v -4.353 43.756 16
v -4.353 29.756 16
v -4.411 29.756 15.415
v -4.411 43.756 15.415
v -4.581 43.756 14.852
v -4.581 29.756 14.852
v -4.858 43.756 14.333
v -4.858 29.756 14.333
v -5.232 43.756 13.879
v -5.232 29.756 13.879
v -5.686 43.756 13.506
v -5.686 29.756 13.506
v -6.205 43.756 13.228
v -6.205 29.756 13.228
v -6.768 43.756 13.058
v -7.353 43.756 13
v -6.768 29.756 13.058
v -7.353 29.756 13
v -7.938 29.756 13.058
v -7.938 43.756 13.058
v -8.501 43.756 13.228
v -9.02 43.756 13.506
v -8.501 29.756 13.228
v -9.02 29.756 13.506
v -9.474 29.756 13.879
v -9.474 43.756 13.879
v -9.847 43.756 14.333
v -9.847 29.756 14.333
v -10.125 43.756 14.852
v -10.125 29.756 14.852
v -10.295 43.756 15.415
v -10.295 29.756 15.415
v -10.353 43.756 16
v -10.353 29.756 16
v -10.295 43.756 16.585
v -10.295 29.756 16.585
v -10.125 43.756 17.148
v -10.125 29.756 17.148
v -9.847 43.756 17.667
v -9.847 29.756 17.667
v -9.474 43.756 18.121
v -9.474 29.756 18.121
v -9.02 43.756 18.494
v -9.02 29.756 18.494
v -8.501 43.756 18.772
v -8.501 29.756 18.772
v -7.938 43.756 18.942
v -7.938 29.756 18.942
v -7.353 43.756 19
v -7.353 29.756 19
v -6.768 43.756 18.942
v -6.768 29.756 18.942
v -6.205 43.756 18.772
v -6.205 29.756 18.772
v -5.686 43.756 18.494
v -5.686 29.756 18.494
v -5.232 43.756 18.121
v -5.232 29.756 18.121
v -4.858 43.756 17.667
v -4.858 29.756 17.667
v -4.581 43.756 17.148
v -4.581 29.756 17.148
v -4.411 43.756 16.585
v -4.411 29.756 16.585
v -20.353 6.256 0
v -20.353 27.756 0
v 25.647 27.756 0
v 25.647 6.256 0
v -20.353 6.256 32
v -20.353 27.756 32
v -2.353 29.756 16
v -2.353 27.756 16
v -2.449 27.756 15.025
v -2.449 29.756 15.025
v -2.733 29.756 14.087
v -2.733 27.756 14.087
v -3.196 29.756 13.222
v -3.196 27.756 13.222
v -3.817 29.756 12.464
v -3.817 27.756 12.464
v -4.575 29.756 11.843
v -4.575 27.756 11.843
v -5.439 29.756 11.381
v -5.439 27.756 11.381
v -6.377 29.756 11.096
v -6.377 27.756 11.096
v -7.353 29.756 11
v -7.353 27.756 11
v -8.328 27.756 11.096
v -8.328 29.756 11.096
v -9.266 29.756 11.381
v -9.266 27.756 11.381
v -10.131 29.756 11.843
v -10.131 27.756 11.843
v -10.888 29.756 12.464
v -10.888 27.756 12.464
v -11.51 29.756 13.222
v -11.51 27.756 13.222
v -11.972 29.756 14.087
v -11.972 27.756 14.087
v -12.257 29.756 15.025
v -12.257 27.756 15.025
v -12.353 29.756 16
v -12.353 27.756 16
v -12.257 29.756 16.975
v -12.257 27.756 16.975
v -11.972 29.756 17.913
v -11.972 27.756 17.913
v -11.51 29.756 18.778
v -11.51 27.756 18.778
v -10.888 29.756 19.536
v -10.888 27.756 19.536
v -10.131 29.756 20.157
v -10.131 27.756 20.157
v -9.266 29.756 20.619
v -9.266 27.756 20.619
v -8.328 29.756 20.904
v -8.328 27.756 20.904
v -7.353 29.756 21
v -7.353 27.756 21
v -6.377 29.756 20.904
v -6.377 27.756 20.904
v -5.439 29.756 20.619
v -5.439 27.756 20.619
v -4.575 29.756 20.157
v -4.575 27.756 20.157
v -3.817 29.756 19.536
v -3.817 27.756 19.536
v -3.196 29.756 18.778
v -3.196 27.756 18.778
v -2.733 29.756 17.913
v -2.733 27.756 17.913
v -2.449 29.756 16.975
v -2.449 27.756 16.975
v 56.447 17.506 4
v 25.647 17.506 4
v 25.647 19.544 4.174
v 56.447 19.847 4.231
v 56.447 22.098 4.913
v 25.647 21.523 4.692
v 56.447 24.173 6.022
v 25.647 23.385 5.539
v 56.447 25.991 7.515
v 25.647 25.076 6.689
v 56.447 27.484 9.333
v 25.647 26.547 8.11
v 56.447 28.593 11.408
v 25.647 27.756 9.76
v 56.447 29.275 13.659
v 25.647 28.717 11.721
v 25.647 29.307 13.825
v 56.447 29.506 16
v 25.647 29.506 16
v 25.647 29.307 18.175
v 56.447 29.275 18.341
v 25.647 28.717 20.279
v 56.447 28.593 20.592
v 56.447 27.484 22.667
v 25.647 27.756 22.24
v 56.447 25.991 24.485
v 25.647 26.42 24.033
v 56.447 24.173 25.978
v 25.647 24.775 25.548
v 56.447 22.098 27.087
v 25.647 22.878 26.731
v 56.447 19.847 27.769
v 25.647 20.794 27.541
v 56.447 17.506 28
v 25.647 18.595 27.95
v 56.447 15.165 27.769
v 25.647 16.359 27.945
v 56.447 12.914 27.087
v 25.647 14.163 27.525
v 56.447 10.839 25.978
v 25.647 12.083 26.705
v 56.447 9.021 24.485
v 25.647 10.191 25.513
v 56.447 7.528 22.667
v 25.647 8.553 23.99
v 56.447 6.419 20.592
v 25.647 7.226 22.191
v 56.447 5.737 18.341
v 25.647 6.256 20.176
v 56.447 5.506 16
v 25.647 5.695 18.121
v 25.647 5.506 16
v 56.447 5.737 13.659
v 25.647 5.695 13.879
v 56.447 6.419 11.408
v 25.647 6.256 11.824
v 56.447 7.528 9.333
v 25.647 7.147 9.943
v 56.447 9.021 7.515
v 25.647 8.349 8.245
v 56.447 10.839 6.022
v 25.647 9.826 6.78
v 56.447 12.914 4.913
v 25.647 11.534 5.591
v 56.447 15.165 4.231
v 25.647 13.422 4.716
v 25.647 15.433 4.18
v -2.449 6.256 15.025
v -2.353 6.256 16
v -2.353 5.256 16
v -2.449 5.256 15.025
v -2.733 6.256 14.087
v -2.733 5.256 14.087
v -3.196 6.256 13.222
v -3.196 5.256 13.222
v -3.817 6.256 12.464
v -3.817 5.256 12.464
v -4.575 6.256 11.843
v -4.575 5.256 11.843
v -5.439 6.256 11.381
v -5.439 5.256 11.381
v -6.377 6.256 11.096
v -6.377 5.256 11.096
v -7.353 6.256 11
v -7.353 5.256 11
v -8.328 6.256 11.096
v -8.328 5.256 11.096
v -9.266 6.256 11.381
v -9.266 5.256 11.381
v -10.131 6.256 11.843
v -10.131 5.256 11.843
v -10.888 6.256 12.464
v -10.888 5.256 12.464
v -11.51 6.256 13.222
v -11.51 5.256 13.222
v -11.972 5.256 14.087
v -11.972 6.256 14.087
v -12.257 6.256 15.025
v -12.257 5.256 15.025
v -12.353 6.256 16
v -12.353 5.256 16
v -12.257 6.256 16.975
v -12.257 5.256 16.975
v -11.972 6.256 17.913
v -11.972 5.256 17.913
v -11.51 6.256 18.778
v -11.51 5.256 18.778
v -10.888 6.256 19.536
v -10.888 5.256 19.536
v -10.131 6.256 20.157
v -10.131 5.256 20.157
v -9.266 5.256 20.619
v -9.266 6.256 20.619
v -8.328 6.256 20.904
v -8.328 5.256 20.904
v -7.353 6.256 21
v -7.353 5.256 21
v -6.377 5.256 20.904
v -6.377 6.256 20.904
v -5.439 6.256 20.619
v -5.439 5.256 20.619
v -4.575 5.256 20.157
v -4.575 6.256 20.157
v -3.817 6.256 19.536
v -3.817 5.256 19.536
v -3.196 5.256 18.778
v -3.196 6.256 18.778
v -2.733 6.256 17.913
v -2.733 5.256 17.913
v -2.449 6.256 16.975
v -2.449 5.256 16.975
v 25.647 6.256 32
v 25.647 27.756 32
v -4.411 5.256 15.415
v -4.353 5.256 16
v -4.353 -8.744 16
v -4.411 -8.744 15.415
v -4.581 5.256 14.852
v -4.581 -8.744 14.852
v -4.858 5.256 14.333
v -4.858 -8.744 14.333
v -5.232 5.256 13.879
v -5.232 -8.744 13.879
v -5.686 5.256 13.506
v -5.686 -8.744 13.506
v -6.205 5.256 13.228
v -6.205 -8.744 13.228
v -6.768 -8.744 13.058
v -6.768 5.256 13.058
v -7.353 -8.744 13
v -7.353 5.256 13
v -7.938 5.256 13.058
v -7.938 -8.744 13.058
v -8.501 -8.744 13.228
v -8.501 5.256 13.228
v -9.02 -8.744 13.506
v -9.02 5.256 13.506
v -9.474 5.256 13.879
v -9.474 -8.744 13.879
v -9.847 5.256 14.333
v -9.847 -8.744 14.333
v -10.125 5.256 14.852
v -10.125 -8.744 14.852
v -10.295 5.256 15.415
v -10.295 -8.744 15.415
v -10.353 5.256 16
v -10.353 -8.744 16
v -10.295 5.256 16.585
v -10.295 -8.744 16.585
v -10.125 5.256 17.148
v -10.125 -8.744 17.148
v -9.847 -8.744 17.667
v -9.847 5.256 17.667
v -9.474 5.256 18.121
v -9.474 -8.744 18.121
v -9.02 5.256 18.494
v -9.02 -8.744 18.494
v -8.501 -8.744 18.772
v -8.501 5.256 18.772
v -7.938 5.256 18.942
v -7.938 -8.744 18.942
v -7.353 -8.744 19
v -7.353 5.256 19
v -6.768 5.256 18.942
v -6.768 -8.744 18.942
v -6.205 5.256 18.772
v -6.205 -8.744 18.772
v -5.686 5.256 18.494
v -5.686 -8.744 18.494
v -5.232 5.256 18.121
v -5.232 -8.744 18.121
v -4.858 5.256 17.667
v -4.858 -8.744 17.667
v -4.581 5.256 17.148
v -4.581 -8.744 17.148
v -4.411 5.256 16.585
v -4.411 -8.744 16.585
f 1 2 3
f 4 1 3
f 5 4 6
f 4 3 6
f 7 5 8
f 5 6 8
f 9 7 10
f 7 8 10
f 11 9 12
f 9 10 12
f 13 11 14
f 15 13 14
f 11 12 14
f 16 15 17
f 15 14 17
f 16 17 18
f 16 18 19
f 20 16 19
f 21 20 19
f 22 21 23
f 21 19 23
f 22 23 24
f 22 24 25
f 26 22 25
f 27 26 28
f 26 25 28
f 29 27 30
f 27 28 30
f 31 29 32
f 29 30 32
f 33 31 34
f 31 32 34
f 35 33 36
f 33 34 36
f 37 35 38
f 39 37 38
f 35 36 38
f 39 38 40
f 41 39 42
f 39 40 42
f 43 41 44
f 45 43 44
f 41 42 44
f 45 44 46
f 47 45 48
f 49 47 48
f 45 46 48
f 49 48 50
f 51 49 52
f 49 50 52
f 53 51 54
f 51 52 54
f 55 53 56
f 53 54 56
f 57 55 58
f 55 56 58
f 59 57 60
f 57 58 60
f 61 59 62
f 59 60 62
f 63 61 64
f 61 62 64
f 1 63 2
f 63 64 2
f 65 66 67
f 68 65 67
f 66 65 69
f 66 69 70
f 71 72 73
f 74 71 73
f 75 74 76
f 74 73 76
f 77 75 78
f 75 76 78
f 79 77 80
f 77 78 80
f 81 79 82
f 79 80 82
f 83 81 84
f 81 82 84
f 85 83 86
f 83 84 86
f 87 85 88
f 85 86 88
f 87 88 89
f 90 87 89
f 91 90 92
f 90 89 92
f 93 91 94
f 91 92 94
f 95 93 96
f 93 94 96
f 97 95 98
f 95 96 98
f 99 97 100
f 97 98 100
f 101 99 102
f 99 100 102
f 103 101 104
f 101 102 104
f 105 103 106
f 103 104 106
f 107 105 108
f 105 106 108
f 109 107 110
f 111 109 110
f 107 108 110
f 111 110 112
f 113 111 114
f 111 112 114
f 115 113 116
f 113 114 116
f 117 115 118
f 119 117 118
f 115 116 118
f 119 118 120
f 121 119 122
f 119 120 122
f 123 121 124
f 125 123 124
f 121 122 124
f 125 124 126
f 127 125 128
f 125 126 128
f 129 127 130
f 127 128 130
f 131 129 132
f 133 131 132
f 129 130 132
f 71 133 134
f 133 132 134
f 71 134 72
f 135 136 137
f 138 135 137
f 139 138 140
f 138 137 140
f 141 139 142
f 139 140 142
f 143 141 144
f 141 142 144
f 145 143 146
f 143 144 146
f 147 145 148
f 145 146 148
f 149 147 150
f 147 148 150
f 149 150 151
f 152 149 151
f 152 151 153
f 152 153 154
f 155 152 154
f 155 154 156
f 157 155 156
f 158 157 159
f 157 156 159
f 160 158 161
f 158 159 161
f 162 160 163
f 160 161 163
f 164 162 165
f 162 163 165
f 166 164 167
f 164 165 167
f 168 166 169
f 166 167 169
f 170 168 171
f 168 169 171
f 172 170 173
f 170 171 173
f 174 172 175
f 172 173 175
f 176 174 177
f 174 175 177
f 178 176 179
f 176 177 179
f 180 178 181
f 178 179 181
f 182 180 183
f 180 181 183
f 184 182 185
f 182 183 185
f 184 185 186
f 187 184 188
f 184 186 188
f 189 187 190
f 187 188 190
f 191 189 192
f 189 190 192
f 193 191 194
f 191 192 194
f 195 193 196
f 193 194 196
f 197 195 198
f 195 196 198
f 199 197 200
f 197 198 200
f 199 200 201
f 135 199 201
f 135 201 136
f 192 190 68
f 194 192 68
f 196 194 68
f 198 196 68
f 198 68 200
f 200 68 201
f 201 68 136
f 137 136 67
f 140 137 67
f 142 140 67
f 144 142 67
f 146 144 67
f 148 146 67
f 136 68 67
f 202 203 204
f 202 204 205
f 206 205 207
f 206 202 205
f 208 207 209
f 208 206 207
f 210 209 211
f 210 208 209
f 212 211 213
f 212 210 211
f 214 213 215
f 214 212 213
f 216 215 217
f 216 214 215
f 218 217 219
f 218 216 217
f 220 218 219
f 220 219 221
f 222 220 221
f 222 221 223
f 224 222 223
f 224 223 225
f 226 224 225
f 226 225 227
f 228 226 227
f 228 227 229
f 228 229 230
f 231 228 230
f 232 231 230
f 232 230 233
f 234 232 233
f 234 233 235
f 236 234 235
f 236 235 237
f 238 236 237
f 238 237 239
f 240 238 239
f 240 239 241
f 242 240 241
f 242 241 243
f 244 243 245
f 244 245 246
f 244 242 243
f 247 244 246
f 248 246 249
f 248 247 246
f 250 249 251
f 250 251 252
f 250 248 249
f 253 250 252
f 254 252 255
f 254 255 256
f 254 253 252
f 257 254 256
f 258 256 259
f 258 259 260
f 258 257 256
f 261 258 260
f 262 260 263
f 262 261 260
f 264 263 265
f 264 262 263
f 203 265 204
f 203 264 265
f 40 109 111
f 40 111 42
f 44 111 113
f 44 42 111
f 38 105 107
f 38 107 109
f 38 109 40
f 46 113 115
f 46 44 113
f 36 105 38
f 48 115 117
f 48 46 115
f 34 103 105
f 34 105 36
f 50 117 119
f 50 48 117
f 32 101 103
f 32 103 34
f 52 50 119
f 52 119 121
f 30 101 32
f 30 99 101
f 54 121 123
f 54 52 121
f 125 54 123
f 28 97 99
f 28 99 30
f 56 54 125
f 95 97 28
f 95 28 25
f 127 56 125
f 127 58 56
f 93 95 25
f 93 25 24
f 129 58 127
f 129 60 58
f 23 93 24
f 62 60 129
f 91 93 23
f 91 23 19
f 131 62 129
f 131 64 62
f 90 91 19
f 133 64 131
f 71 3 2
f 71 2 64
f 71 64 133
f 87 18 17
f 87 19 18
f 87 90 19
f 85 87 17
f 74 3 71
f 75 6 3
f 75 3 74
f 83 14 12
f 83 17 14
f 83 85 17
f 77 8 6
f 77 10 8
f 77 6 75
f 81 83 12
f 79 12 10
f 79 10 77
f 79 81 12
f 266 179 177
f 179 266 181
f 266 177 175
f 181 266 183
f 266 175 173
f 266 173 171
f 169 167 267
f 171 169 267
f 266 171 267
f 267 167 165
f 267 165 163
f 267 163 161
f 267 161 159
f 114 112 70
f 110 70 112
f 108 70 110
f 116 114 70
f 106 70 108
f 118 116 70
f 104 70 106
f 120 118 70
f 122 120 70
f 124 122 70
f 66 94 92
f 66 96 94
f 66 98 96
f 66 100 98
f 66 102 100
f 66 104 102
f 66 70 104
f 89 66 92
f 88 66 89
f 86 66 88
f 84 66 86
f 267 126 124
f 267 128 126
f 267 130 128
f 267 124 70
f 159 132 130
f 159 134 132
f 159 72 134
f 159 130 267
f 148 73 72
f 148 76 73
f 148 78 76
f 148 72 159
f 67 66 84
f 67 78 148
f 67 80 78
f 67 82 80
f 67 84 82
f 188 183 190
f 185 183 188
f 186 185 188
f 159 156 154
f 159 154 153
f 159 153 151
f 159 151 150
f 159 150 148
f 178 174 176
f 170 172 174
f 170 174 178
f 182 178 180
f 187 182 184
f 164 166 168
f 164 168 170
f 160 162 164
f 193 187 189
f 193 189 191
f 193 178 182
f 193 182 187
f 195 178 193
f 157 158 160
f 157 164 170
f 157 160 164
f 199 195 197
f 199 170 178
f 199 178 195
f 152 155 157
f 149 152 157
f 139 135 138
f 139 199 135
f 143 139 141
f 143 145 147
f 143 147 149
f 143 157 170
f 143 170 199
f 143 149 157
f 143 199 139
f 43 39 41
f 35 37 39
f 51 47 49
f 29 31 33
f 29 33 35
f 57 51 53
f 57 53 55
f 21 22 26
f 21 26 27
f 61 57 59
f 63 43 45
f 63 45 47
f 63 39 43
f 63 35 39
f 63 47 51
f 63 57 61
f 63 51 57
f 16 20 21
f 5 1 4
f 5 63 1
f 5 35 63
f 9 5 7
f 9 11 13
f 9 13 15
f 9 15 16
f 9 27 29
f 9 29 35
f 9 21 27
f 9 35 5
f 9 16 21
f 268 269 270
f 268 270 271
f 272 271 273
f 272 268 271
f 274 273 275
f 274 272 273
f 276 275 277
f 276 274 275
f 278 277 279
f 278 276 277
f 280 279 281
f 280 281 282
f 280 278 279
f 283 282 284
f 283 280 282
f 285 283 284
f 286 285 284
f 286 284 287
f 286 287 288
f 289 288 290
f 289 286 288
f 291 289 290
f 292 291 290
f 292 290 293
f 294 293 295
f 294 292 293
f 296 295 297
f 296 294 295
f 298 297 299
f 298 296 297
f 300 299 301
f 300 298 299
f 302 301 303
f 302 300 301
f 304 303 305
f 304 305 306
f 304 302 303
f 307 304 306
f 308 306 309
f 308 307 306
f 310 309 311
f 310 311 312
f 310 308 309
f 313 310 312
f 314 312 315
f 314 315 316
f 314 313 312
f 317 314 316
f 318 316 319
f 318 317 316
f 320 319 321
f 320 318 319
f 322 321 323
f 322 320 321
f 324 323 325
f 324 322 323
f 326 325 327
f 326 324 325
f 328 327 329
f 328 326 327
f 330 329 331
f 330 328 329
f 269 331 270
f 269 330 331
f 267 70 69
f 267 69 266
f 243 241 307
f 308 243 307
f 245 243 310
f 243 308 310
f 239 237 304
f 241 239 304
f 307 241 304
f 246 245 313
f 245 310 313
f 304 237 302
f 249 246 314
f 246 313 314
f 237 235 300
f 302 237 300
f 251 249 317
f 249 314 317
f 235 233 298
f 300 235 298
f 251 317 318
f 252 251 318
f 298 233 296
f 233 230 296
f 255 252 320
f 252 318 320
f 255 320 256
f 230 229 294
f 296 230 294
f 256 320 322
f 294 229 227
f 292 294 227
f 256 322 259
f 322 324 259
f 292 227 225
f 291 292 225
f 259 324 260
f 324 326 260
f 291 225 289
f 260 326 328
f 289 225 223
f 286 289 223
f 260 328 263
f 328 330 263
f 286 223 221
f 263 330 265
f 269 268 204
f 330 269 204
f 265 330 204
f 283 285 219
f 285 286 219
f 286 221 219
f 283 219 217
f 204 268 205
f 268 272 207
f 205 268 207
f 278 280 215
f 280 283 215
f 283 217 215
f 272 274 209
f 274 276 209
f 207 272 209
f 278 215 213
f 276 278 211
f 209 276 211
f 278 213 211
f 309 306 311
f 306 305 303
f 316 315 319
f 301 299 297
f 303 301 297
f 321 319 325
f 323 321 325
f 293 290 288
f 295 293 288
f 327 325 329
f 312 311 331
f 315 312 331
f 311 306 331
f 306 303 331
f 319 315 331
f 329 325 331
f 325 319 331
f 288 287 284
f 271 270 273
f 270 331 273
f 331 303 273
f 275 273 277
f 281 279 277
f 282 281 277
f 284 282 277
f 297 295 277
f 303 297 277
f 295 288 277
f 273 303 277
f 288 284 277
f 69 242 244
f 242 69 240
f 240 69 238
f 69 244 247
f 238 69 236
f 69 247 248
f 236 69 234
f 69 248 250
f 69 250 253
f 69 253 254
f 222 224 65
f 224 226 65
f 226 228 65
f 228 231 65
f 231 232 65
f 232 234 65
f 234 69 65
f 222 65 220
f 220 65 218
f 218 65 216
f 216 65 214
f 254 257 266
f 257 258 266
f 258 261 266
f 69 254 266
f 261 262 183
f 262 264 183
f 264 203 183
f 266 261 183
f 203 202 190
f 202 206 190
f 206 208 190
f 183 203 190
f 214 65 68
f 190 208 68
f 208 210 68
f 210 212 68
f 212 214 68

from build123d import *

# Parameters (mm, degrees)
SKETCH_2_W      = 46
SKETCH_2_H      = 21.5
EXTRUDE_1_DEPTH = 32
SKETCH_3_R      = 5
EXTRUDE_2_DEPTH = 2
SKETCH_4_R      = 3
EXTRUDE_3_DEPTH = 14
SKETCH_5_R      = 12
EXTRUDE_4_DEPTH = 30.8


with BuildPart() as part:
    # 草图2 → 凸台-拉伸1 (new body)
    with BuildSketch(Plane.XY):
        with Locations((2.647117171, 17.006037157)):
            Rectangle(SKETCH_2_W, SKETCH_2_H)
    extrude(amount=EXTRUDE_1_DEPTH)

    # 草图3 → 凸台-拉伸2 (add)
    with BuildSketch(Plane(origin=(0, 27.756037157, 0), x_dir=(1, 0, 0), z_dir=(0, 1, 0))):
        with Locations((-7.352882829, -16)):
            Circle(SKETCH_3_R)
    extrude_2 = extrude(amount=EXTRUDE_2_DEPTH)

    # 草图4 → 凸台-拉伸3 (add)
    with BuildSketch(Plane(origin=(0, 29.756037157, 0), x_dir=(1, 0, 0), z_dir=(0, 1, 0))):
        with Locations((-7.352882829, -16)):
            Circle(SKETCH_4_R)
    extrude_3 = extrude(amount=EXTRUDE_3_DEPTH)

    # 镜向1: 凸台-拉伸2, 凸台-拉伸3 across plane
    add(extrude_2.mirror(Plane.ZX.offset(17.506037157)))
    add(extrude_3.mirror(Plane.ZX.offset(17.506037157)))

    # 草图5 → 凸台-拉伸4 (add)
    with BuildSketch(Plane(origin=(25.647117171, 0, 0), x_dir=(0, 0, -1), z_dir=(1, 0, 0))):
        with Locations((-16, 17.506037157)):
            Circle(SKETCH_5_R)
    extrude(amount=EXTRUDE_4_DEPTH)


solid = part.part
